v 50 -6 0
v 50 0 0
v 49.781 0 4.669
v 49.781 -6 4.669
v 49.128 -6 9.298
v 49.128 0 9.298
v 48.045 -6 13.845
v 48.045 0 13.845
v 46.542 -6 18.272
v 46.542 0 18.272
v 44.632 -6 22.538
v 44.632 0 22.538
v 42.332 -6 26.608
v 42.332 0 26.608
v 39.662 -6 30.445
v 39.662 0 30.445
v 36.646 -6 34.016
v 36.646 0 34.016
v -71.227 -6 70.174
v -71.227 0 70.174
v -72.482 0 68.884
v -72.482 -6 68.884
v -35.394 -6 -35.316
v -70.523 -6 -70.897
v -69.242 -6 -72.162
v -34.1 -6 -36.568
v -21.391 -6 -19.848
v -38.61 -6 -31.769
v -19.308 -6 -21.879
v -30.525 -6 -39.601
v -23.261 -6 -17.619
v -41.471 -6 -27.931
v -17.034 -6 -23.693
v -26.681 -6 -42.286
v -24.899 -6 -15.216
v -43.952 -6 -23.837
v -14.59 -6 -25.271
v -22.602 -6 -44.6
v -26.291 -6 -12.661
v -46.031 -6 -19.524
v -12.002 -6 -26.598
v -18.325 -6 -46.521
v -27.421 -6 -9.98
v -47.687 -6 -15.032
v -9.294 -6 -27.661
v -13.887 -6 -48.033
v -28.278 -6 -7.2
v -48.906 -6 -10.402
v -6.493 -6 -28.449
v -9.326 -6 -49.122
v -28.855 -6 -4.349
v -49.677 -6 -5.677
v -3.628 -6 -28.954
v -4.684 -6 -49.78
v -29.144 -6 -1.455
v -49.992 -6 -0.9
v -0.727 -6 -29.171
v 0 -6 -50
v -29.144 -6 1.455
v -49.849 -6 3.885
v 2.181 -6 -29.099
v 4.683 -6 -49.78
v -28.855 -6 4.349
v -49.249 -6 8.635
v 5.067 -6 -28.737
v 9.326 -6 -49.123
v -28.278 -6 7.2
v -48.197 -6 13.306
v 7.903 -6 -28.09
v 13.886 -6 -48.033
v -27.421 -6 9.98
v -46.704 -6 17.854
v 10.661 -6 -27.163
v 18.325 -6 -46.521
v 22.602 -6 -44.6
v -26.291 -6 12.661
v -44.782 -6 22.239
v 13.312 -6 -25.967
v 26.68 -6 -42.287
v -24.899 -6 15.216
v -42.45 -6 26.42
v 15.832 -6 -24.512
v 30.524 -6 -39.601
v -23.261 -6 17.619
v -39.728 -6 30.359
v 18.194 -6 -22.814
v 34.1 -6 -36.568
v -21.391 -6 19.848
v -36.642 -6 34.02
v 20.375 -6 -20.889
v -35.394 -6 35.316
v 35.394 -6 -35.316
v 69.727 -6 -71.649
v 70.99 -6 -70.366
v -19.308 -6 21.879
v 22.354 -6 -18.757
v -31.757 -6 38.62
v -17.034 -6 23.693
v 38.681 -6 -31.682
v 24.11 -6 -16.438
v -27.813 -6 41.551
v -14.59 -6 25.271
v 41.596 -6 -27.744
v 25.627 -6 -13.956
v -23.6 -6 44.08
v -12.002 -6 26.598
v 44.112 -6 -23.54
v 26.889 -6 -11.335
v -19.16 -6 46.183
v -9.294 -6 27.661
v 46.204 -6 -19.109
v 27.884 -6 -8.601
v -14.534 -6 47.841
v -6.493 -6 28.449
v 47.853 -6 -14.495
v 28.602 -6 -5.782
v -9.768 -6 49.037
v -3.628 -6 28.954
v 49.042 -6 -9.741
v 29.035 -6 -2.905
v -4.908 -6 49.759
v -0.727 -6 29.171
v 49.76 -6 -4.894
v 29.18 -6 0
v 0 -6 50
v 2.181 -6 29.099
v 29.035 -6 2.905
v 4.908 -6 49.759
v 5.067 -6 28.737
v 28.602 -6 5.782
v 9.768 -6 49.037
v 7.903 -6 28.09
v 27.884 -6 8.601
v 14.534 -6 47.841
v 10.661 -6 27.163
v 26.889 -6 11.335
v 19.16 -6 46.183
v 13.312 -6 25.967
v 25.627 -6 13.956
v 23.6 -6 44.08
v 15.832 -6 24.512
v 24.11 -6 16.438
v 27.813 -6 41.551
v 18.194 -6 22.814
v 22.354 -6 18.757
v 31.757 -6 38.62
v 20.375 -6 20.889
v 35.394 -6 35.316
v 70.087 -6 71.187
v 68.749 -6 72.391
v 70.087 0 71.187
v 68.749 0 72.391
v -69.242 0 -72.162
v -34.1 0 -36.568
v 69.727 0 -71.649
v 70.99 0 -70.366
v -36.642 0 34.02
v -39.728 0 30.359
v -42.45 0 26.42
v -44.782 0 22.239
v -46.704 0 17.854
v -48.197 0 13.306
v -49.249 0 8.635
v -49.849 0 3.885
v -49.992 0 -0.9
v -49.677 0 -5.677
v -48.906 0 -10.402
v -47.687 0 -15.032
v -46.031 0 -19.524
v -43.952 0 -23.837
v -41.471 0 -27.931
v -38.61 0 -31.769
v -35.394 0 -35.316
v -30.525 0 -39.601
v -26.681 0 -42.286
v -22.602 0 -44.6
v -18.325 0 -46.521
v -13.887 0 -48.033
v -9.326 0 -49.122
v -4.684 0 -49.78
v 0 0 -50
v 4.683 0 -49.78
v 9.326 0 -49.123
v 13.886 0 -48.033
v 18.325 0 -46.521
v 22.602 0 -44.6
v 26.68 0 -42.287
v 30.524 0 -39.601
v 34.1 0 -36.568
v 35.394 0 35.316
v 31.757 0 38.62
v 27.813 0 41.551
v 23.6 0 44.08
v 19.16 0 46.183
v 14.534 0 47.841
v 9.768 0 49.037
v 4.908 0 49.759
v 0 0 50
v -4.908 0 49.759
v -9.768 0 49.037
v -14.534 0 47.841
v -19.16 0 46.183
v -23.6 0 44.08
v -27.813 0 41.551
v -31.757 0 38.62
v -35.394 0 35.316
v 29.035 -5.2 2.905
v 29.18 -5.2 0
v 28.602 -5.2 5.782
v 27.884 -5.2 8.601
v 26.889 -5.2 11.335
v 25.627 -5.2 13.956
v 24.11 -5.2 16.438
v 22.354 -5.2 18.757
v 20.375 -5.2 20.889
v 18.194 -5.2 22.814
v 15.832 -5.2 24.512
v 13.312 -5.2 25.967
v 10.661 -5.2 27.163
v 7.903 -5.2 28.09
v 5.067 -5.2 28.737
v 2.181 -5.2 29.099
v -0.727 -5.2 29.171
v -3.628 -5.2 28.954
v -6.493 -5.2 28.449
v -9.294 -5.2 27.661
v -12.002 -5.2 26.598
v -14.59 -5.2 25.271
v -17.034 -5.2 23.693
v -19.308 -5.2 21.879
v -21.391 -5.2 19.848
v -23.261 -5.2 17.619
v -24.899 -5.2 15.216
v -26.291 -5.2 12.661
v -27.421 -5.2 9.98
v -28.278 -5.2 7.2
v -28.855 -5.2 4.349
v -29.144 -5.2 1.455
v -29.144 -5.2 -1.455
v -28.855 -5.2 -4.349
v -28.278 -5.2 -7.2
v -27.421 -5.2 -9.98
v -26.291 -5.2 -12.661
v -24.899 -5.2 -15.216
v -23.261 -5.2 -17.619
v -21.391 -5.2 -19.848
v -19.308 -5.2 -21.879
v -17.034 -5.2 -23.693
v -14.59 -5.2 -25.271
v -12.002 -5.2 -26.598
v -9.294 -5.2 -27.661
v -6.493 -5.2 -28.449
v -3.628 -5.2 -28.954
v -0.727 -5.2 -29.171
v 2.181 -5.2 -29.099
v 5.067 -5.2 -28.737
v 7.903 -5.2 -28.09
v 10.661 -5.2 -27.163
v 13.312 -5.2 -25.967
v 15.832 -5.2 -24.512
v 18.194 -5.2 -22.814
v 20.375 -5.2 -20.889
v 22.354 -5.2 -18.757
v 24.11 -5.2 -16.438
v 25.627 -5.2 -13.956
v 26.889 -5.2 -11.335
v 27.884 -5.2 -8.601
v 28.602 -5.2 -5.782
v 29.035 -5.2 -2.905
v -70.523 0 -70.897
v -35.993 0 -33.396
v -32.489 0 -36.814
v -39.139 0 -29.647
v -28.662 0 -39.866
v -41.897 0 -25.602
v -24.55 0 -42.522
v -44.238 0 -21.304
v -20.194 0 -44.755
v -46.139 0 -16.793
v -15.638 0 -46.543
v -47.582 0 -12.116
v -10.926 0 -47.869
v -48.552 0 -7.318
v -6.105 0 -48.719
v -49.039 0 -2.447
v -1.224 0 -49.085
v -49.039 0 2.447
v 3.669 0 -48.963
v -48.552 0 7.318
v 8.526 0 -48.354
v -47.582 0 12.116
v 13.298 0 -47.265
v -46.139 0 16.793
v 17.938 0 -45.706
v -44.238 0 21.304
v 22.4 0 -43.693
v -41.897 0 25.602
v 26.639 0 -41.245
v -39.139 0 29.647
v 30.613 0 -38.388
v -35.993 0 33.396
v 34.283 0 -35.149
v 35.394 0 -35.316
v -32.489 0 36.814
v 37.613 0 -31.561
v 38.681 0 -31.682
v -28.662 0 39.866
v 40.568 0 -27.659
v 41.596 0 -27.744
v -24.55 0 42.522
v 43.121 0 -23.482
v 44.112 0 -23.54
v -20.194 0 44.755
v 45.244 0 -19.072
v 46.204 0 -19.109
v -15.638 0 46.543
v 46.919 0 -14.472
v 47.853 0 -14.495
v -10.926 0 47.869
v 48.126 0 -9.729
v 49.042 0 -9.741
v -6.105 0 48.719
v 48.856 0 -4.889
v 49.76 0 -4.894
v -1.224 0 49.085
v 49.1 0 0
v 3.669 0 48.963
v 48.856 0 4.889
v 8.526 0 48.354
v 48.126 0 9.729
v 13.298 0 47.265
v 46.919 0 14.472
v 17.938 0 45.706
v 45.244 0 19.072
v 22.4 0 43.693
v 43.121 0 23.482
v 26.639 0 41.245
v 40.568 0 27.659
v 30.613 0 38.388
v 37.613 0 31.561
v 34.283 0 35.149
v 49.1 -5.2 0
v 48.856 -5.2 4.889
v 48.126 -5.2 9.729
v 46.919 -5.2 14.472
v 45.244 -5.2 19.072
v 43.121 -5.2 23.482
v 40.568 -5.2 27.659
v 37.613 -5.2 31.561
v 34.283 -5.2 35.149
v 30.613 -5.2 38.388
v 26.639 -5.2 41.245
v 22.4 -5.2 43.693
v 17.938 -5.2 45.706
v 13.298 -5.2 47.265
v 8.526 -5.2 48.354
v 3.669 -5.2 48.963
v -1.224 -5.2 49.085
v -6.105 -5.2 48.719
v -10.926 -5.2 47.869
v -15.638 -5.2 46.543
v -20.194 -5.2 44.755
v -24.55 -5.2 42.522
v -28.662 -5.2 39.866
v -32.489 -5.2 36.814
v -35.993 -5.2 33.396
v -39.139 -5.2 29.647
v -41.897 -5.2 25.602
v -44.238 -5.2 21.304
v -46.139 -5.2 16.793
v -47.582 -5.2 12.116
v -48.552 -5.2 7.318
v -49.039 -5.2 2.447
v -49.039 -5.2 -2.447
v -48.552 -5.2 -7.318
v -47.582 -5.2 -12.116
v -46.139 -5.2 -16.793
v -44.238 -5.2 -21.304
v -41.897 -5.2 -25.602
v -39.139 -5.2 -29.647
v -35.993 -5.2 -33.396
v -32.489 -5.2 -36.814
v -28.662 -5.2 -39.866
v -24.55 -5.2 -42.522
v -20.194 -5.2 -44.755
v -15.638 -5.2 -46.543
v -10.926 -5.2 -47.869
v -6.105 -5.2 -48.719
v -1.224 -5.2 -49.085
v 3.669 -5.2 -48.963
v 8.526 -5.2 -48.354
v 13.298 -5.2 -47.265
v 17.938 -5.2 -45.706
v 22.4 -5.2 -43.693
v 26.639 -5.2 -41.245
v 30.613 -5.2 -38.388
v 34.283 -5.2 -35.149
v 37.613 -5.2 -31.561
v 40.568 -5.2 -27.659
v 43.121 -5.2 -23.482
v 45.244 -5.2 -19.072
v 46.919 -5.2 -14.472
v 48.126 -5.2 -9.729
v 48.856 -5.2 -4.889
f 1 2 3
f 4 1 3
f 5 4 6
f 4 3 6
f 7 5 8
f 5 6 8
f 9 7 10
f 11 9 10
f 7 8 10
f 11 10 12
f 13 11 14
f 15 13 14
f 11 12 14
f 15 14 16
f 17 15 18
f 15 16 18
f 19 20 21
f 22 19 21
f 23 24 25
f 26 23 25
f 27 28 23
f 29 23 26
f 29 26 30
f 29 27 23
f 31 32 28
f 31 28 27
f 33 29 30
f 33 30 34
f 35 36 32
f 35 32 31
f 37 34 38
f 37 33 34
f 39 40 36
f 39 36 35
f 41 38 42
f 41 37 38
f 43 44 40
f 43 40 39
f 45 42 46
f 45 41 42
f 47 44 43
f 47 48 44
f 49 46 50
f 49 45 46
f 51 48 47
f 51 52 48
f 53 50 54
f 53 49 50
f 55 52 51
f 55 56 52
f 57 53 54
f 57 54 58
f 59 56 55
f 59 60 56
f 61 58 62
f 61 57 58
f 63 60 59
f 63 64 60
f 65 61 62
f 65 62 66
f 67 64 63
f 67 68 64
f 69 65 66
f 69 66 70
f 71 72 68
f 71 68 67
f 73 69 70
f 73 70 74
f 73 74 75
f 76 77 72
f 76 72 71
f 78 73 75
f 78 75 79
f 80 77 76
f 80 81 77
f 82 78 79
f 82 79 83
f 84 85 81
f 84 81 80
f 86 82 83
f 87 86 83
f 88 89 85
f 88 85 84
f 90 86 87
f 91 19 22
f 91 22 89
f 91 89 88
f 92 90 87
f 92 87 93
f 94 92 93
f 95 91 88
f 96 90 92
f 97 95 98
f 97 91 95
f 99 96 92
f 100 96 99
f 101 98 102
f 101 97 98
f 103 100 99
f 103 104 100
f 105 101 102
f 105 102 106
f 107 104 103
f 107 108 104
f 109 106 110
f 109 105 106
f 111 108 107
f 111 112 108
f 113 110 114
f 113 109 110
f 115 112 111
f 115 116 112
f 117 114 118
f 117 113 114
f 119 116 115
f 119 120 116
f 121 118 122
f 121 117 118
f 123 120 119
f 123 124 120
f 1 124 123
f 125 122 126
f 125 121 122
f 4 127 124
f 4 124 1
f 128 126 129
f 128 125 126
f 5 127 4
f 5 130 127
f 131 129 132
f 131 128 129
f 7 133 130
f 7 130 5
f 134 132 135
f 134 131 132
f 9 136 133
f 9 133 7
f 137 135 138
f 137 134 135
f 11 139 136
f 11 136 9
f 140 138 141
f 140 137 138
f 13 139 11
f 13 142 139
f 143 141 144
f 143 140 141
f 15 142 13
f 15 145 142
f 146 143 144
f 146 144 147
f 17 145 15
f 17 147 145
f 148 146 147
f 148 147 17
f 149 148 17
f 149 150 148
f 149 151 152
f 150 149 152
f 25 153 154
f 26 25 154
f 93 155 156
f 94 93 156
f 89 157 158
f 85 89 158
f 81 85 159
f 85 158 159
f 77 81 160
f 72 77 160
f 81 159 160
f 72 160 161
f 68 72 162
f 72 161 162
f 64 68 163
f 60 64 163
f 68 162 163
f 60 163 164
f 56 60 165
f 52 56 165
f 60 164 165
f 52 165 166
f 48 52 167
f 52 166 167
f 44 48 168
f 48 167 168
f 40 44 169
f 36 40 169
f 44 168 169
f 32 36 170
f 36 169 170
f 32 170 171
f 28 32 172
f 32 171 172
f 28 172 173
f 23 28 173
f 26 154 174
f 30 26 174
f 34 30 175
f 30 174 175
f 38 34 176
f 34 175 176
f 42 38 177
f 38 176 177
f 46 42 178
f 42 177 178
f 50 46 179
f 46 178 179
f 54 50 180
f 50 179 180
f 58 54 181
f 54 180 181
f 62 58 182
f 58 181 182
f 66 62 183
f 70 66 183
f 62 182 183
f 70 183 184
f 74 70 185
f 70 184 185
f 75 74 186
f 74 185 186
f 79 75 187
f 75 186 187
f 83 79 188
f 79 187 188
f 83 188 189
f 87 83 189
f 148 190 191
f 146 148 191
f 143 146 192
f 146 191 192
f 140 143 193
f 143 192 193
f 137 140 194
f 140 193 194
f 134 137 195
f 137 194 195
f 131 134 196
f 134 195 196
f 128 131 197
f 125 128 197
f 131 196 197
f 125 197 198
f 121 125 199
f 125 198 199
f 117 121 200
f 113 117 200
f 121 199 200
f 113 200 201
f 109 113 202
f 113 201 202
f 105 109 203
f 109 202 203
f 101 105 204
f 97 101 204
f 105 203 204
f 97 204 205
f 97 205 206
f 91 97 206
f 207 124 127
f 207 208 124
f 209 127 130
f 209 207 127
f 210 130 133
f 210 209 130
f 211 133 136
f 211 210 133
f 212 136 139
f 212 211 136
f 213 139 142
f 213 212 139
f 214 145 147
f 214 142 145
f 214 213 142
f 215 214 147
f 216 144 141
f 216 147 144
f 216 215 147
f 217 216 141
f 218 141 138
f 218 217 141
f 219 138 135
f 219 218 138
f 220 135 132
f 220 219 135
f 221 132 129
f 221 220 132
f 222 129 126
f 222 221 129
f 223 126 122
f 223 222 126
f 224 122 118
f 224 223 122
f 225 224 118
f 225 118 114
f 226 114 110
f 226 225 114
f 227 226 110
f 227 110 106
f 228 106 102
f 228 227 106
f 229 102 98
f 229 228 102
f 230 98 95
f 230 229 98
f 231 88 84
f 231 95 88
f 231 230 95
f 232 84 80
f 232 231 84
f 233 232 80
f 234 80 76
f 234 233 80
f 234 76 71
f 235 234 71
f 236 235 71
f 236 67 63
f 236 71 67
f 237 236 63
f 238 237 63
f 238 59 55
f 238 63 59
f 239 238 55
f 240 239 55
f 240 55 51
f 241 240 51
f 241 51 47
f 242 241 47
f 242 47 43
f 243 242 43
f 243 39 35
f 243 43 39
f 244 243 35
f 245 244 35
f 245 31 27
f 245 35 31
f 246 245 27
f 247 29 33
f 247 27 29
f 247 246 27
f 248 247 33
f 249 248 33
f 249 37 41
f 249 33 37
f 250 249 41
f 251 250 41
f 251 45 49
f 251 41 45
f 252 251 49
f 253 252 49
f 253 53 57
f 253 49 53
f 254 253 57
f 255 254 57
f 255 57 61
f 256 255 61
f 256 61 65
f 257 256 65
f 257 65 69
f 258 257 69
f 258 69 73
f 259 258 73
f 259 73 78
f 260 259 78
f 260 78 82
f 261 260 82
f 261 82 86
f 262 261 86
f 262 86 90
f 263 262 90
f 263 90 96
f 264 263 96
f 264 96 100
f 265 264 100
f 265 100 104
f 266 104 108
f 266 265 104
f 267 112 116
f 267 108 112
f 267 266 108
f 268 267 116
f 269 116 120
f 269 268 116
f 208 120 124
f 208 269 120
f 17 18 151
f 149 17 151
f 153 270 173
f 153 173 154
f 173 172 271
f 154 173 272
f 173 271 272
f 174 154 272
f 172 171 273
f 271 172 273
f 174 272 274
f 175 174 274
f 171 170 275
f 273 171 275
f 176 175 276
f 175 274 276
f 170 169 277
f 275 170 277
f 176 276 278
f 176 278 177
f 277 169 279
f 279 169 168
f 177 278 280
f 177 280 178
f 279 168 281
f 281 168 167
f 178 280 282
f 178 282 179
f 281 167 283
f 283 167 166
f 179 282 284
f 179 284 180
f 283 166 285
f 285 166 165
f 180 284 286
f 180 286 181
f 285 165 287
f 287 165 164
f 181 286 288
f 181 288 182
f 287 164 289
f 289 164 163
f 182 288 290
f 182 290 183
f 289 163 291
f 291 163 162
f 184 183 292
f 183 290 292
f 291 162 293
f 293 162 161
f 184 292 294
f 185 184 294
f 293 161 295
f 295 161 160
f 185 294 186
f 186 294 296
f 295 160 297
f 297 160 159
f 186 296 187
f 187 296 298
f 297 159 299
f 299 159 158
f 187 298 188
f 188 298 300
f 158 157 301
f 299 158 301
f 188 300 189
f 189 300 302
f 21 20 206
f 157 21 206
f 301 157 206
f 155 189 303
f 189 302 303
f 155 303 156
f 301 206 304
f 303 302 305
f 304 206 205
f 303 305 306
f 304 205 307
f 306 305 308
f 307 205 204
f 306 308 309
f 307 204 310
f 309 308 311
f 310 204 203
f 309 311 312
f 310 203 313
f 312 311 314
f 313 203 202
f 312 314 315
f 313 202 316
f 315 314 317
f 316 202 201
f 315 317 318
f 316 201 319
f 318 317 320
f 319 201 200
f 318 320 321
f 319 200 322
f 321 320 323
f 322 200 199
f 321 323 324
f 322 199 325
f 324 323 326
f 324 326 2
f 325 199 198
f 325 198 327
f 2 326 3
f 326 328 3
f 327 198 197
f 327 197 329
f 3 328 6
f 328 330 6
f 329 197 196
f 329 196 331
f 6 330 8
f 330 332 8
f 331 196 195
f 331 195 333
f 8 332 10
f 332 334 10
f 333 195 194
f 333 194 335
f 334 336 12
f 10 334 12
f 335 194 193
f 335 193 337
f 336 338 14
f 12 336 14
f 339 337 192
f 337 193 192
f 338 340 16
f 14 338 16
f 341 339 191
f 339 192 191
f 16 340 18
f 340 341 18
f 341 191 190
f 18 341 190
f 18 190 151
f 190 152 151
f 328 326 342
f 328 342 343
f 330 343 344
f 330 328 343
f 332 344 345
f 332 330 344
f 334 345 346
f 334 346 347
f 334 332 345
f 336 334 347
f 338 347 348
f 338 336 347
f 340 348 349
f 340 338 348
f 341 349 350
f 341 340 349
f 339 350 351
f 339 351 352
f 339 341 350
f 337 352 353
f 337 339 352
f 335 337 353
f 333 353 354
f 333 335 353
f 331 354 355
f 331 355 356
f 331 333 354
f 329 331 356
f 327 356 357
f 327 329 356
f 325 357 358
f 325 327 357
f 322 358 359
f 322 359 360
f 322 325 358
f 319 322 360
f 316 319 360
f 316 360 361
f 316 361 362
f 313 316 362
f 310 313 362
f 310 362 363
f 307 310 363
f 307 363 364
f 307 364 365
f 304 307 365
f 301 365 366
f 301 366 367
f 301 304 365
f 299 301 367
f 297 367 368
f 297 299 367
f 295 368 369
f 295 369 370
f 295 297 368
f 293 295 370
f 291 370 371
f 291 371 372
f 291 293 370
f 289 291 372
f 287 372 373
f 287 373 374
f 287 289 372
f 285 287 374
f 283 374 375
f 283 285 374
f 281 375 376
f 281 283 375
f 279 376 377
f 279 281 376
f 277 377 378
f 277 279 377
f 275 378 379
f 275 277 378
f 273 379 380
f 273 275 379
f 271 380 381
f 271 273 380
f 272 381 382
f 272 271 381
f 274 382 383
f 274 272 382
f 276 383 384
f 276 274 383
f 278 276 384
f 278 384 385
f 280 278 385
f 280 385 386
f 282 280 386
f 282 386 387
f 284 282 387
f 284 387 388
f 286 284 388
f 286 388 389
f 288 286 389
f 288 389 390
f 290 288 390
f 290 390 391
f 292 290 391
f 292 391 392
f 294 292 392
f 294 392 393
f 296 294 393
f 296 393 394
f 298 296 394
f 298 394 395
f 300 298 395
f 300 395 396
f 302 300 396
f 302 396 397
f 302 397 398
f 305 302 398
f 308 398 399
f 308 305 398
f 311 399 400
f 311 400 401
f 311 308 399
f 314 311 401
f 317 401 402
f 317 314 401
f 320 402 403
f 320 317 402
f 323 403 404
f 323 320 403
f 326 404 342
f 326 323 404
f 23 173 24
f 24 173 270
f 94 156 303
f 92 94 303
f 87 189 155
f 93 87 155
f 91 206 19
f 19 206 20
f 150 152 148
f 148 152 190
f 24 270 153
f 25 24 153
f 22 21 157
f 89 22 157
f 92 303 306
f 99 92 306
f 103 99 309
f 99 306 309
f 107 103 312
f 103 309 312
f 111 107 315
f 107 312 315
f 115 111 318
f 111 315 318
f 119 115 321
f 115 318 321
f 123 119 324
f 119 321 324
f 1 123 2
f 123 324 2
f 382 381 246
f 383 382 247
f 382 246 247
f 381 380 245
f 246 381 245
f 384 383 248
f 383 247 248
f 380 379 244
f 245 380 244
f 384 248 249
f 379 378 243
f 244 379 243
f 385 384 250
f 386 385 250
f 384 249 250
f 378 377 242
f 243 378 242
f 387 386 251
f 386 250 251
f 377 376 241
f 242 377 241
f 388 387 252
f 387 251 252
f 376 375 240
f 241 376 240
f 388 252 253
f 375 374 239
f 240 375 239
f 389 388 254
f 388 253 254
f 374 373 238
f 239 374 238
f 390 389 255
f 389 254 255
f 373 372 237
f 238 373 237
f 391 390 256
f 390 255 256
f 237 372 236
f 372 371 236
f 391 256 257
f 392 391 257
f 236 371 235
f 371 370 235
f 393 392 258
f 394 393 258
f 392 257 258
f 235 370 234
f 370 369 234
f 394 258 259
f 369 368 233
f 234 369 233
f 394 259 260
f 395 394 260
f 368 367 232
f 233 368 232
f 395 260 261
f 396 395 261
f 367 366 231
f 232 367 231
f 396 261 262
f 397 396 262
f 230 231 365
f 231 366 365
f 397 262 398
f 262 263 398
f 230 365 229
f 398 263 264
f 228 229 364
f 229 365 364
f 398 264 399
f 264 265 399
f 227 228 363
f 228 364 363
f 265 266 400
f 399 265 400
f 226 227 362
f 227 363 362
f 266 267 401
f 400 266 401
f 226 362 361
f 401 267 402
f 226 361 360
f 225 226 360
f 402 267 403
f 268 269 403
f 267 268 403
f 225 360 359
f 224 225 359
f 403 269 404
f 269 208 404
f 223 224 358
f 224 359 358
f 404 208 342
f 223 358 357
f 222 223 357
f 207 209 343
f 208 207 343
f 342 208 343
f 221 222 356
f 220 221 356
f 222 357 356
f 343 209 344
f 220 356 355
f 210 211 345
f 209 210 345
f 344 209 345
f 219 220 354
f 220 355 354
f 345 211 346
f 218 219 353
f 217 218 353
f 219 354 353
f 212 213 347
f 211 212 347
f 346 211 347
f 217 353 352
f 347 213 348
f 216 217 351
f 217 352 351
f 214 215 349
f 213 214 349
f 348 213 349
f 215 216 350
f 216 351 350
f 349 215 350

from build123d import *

# Parameters (mm, degrees)
F0_W     = 70.7883353009
F0_H     = 70.6329355565
F1_DEPTH = 6
F2_R     = 49.1
F3_DEPTH = 5.2
F4_R     = 29.1804773136
F5_DEPTH = 25


with BuildPart() as f1:
    # F0 (on Front) → F1 (new body)
    with BuildSketch(Plane.XZ):
        with BuildLine():
            ThreePointArc((35.3941676505, -35.3164677782), (46.204482372, -19.1087887826), (50, 0))
            ThreePointArc((50, 0), (46.5418074661, 18.2718405693), (36.6455936884, 34.0161794331))
            ThreePointArc((36.6455936884, 34.0161794331), (36.0257476104, 34.6719700784), (35.3941676505, 35.3164677782))
            Line((35.3941676505, 35.3164677782), (35.3941676505, -35.3164677782))
        make_face()
        with BuildLine():
            ThreePointArc((35.3941676505, 35.3164677782), (36.0257476104, 34.6719700784), (36.6455936884, 34.0161794331))
            Line((36.6455936884, 34.0161794331), (70.0867437781, 71.187263365))
            Line((70.0867437781, 71.187263365), (68.7485847566, 72.3911447683))
            Line((68.7485847566, 72.3911447683), (35.3941676505, 35.3164677782))
        make_face()
        with BuildLine():
            Line((70.9903525089, -70.3661009157), (35.3941676505, -35.3164677782))
            ThreePointArc((35.3941676505, -35.3164677782), (34.7525403407, -35.9480310986), (34.0996454535, -36.5679392357))
            Line((34.0996454535, -36.5679392357), (69.7274450602, -71.6487017016))
            Line((69.7274450602, -71.6487017016), (70.9903525089, -70.3661009157))
        make_face()
        with BuildLine():
            ThreePointArc((34.0996454535, -36.5679392357), (34.7525403407, -35.9480310986), (35.3941676505, -35.3164677782))
            Line((35.3941676505, -35.3164677782), (-35.3941676505, -35.3164677782))
            ThreePointArc((-35.3941676505, -35.3164677782), (-34.7527012082, -35.9478755803), (-34.0999727359, -36.5676340418))
            ThreePointArc((-34.0999727359, -36.5676340418), (-0.0002237505, -49.9999999995), (34.0996454535, -36.5679392357))
        make_face()
        Rectangle(F0_W, F0_H)
        with BuildLine():
            Line((-35.3941676505, 35.3164677782), (35.3941676505, 35.3164677782))
            ThreePointArc((35.3941676505, 35.3164677782), (0, 50), (-35.3941676505, 35.3164677782))
        make_face()
        with BuildLine():
            ThreePointArc((-36.6424362928, 34.0195805754), (-49.9918991162, -0.9000126416), (-35.3941676505, -35.3164677782))
            Line((-35.3941676505, -35.3164677782), (-35.3941676505, 35.3164677782))
            ThreePointArc((-35.3941676505, 35.3164677782), (-36.0241385188, 34.6736419197), (-36.6424362928, 34.0195805754))
        make_face()
        with BuildLine():
            ThreePointArc((-34.0999727359, -36.5676340418), (-34.7527012082, -35.9478755803), (-35.3941676505, -35.3164677782))
            Line((-35.3941676505, -35.3164677782), (-70.5225346289, -70.8973310818))
            Line((-70.5225346289, -70.8973310818), (-69.24162355, -72.161952293))
            Line((-69.24162355, -72.161952293), (-34.0999727359, -36.5676340418))
        make_face()
        with BuildLine():
            ThreePointArc((-36.6424362928, 34.0195805754), (-36.0241385188, 34.6736419197), (-35.3941676505, 35.3164677782))
            Line((-35.3941676505, 35.3164677782), (-71.2271848866, 70.1739048632))
            Line((-71.2271848866, 70.1739048632), (-72.4822921078, 68.8836700538))
            Line((-72.4822921078, 68.8836700538), (-36.6424362928, 34.0195805754))
        make_face()
    extrude(amount=F1_DEPTH)

    # F2 (on Front) → F3 (cut)
    with BuildSketch(Plane.XZ):
        Circle(F2_R)
    extrude(amount=F3_DEPTH, mode=Mode.SUBTRACT)

    # F4 (on Front) → F5 (cut)
    with BuildSketch(Plane.XZ):
        Circle(F4_R)
    extrude(amount=F5_DEPTH, mode=Mode.SUBTRACT)


solid = f1.part
